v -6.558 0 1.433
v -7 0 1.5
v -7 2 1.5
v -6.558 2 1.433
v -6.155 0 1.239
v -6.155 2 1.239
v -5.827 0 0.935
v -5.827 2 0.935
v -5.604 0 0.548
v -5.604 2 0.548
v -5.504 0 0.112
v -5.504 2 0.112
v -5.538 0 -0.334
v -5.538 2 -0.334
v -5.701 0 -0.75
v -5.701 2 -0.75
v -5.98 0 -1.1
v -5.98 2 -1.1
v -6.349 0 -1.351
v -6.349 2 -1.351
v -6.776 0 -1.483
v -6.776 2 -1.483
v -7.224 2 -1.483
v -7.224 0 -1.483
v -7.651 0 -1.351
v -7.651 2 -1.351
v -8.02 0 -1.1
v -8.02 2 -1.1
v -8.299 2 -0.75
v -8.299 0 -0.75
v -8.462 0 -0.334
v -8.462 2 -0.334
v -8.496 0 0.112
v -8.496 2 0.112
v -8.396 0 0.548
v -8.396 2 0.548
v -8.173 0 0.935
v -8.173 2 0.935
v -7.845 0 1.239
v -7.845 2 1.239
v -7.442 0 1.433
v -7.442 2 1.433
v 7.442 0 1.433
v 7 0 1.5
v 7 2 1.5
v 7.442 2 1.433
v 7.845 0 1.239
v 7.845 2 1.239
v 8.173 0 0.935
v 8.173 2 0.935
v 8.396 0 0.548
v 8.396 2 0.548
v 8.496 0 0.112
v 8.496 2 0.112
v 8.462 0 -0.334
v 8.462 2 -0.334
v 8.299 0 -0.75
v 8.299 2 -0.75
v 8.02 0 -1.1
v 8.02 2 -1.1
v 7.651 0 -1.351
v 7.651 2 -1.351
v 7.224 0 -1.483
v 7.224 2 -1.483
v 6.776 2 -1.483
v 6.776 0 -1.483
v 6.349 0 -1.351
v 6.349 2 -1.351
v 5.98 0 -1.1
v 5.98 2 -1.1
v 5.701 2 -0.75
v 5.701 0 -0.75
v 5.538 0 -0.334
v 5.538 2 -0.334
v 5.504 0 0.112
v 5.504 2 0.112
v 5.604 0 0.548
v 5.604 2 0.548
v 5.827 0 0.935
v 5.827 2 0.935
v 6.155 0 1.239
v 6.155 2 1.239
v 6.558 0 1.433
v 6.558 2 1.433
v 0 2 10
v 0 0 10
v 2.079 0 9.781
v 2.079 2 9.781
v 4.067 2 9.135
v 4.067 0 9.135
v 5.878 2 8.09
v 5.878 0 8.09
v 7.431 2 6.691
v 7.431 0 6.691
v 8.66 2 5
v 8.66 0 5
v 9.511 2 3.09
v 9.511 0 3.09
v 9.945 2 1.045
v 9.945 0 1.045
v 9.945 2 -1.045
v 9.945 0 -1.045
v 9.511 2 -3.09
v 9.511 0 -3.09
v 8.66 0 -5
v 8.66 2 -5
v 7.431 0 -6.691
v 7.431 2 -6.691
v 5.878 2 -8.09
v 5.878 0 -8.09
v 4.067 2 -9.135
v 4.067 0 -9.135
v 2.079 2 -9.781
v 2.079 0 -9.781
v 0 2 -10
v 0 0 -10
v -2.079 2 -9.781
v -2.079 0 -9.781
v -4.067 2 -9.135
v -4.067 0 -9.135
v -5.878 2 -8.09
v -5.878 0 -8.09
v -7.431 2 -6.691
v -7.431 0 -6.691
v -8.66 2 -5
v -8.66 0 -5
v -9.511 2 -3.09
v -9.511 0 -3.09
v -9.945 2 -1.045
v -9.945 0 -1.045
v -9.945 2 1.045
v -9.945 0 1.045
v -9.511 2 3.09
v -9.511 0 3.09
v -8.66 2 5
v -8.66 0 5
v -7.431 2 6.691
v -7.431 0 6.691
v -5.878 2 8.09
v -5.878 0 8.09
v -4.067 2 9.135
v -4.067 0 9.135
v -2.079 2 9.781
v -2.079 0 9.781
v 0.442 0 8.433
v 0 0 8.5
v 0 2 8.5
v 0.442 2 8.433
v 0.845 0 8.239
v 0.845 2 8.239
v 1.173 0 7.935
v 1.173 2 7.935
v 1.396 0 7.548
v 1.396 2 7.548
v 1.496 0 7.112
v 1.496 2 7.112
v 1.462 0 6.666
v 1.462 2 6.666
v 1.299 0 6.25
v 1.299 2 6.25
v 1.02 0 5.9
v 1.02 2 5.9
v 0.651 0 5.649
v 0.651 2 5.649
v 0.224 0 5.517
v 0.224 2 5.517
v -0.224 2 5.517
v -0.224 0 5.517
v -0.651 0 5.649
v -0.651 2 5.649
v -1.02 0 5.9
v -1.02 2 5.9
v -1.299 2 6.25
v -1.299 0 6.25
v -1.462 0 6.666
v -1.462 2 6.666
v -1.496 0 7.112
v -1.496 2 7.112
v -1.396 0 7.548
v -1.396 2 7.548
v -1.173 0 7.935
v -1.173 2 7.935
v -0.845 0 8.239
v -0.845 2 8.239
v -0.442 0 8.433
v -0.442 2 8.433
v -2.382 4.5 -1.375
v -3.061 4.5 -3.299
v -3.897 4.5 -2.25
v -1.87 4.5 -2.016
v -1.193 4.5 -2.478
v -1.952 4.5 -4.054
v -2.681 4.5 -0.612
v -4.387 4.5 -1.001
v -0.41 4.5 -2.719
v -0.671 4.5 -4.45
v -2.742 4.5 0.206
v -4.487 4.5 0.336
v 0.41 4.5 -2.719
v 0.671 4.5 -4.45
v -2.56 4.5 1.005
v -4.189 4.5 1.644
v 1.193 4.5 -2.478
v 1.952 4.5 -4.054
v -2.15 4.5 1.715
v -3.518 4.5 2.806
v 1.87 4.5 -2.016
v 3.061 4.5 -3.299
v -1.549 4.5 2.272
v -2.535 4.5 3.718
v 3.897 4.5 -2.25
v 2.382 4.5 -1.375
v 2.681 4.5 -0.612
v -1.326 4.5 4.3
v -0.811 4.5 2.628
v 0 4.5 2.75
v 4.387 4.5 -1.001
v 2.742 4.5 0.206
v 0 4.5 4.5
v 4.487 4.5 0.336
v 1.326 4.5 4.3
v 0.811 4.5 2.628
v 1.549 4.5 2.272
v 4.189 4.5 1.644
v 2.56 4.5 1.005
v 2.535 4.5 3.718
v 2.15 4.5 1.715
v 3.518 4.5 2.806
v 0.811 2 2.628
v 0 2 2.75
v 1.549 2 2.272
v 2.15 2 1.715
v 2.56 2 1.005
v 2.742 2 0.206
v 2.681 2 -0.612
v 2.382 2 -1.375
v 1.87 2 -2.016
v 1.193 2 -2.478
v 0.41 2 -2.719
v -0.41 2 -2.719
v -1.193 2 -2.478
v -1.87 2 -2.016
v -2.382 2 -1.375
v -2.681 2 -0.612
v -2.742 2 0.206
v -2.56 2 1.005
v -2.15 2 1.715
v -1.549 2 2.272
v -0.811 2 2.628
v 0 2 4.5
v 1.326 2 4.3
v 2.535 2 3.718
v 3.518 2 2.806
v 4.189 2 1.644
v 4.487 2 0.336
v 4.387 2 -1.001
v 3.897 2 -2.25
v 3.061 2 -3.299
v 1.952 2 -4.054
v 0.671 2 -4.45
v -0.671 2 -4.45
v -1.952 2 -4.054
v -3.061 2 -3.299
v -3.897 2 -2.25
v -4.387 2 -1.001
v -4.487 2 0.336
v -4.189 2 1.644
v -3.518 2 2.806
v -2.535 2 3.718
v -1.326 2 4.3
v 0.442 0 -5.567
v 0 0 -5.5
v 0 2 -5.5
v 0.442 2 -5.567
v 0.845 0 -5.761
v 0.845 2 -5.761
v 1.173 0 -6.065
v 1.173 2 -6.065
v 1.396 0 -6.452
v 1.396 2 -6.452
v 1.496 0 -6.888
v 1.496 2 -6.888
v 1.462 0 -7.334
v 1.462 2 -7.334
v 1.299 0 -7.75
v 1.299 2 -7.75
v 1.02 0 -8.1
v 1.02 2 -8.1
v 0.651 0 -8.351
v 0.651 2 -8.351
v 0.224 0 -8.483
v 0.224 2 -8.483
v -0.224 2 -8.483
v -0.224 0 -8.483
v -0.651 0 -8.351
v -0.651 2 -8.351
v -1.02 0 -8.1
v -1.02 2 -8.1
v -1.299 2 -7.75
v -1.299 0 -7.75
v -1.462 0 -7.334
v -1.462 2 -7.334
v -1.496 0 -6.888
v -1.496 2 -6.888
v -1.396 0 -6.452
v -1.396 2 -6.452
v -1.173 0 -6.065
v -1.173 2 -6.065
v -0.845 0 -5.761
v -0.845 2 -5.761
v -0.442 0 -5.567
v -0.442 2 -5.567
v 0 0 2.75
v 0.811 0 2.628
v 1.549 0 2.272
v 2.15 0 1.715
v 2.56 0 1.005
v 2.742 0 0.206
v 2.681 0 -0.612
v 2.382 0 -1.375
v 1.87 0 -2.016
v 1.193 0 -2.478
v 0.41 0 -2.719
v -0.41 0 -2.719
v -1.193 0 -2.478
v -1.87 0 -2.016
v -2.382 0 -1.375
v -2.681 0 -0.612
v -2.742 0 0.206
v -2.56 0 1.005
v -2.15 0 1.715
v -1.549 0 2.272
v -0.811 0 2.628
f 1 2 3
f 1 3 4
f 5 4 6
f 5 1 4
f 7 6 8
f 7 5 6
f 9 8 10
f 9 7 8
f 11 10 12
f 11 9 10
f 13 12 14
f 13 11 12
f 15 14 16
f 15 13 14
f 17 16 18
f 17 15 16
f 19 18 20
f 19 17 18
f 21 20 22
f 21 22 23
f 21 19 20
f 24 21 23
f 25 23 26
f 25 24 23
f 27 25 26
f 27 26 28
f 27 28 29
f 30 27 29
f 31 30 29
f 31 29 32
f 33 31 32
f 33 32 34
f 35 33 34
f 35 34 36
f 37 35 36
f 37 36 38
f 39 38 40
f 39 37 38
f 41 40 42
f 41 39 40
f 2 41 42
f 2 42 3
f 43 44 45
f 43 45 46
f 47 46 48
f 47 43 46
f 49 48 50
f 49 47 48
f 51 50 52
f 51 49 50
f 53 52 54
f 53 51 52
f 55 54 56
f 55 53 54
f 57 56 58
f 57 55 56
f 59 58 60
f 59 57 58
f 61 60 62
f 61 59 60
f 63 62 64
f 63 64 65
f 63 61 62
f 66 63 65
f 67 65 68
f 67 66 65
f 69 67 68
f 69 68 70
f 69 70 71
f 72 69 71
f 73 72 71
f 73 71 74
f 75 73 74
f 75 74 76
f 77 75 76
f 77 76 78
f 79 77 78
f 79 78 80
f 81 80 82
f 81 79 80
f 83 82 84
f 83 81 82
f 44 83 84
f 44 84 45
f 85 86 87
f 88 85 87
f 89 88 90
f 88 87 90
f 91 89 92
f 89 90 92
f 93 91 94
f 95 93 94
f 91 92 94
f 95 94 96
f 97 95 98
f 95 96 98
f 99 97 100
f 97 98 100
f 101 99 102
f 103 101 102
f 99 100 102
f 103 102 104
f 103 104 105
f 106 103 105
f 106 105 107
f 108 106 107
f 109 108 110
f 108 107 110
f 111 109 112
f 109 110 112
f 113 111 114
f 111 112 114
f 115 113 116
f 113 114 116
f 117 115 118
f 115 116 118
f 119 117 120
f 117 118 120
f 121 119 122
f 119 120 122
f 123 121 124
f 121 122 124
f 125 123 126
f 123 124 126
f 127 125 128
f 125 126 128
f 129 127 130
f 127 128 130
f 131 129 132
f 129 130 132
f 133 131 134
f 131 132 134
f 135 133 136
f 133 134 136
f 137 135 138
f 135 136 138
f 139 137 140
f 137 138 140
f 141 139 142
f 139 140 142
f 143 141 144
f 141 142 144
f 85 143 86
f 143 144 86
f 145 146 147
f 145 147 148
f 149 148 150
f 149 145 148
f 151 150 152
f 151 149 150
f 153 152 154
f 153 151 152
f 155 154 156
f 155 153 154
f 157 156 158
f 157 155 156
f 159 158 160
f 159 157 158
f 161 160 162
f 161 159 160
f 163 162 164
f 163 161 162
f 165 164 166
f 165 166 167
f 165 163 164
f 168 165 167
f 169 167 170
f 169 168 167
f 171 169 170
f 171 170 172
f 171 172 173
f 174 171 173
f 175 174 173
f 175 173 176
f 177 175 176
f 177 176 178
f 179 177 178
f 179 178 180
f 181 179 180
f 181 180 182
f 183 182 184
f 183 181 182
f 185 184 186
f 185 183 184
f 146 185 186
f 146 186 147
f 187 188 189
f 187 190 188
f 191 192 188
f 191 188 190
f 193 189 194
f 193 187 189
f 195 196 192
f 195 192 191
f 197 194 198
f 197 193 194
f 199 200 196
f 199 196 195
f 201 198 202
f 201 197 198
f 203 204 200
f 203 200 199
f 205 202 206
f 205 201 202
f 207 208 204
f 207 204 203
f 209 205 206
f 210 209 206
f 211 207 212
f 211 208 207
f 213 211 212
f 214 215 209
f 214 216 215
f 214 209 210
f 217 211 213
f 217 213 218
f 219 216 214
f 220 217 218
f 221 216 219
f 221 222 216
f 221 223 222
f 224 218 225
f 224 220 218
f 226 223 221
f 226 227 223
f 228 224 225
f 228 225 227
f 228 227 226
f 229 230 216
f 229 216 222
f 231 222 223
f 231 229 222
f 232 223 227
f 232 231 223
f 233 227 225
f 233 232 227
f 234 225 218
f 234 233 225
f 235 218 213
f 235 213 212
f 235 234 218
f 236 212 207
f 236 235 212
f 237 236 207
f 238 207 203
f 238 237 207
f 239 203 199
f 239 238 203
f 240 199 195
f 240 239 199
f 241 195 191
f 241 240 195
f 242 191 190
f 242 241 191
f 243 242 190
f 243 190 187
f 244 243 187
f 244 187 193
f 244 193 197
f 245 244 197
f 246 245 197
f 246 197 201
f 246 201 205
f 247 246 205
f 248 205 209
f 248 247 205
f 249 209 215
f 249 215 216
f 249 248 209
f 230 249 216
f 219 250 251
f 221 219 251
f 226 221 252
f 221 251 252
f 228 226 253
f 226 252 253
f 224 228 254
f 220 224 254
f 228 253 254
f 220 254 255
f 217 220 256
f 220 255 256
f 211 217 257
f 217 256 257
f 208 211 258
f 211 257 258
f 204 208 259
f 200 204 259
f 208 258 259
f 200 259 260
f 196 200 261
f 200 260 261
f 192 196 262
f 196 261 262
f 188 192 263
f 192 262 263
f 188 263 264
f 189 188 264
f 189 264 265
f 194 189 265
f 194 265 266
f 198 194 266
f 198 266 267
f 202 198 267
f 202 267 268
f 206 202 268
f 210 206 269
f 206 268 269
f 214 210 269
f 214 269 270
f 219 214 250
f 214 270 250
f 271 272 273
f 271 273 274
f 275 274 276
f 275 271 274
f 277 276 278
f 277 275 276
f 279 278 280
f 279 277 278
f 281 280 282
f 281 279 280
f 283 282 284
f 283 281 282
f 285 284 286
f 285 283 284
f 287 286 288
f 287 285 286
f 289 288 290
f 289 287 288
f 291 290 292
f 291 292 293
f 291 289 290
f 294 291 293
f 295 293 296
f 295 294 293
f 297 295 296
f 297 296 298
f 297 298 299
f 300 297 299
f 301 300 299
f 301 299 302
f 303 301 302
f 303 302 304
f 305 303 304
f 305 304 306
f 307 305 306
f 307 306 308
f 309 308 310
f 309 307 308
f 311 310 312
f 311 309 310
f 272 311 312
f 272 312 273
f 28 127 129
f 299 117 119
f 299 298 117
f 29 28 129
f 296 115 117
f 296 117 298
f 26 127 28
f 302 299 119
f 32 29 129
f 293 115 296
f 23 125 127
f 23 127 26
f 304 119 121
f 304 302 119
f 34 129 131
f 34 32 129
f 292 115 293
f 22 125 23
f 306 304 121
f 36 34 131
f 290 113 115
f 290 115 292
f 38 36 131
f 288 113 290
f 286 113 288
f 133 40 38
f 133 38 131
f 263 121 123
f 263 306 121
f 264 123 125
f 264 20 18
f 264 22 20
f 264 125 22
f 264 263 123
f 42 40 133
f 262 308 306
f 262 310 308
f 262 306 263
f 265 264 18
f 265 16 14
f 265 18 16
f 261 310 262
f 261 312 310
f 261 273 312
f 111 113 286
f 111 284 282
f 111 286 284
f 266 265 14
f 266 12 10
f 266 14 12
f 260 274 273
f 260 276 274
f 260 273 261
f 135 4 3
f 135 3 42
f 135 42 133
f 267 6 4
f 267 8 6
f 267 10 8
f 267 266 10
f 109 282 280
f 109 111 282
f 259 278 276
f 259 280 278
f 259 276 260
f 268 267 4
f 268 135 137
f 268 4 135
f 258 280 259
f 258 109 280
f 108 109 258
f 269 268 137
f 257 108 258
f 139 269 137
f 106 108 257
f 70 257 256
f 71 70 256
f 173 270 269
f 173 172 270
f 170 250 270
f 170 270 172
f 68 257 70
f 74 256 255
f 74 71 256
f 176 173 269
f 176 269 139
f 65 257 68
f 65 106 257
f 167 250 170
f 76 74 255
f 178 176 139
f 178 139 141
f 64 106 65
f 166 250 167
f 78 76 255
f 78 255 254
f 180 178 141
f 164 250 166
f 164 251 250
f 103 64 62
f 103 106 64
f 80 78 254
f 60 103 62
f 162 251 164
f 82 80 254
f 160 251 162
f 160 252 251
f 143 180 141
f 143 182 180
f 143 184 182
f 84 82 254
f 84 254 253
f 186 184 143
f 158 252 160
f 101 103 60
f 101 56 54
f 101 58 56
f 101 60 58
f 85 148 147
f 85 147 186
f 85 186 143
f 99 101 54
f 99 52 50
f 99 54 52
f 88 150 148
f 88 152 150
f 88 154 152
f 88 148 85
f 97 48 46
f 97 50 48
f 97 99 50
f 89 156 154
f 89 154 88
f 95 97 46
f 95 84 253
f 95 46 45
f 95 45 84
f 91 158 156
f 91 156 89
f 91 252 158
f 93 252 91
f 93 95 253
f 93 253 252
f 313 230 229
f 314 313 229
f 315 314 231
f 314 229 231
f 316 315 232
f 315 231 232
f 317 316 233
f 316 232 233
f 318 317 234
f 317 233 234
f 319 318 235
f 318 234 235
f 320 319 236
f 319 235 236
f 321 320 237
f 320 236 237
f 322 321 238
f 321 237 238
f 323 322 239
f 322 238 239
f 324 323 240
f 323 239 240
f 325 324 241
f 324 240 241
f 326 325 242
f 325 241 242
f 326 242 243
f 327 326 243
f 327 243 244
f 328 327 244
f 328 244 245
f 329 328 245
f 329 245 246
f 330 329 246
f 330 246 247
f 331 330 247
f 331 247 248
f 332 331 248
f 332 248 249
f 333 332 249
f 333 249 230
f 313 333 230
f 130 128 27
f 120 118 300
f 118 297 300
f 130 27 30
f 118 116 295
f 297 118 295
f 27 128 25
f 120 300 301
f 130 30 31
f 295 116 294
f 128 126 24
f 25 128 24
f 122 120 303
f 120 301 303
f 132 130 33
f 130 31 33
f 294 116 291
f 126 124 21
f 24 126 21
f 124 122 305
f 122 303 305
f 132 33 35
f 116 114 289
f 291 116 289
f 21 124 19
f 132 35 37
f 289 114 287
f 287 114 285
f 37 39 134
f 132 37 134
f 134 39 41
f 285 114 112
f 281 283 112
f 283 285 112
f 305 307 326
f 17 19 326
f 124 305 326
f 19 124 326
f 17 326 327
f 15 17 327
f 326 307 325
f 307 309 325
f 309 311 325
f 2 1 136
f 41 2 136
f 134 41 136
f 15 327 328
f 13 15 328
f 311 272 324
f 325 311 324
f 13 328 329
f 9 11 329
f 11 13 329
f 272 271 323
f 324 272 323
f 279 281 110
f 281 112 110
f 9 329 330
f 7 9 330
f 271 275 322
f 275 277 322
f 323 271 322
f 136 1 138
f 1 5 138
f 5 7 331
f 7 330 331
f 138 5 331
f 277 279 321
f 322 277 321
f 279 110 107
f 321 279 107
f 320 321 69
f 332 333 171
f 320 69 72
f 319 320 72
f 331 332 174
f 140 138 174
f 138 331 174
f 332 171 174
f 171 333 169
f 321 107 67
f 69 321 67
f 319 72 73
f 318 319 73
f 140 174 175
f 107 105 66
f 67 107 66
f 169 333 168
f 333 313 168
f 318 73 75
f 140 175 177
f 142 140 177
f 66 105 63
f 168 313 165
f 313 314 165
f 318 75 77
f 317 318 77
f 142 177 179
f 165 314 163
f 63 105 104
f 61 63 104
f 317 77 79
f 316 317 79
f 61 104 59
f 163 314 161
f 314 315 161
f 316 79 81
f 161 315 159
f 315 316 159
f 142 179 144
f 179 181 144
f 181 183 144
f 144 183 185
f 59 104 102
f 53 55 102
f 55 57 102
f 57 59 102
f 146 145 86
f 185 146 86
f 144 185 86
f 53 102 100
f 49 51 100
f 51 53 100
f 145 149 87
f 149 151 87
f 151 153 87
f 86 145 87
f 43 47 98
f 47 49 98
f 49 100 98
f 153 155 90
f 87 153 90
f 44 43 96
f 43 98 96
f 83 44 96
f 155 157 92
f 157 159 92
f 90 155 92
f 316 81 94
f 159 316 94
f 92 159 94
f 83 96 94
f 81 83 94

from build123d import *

# Parameters (mm, degrees)
SKETCH_1_R          = 10
SKETCH_1_R_2        = 1.5
EXTRUDE_1_DEPTH     = 2
SKETCH_2_R          = 4.5
SKETCH_2_R_2        = 2.75
EXTRUDE_2_DEPTH     = 2.5
SKETCH_3_R          = 2.75
CUT_EXTRUDE_1_DEPTH = 15.361406616


with BuildPart() as part:
    # 草图1 → 凸台-拉伸1 (new body)
    with BuildSketch(Plane(origin=(0, 0, 0), x_dir=(1, 0, 0), z_dir=(0, 1, 0))):
        with Locations(Location((0, 0, 0), (0, 0, 270))):
            Circle(SKETCH_1_R)
        with Locations(Location((0, 7, 0), (0, 0, 270))):
            Circle(SKETCH_1_R_2, mode=Mode.SUBTRACT)
        with Locations(Location((-7, 0, 0), (0, 0, 270))):
            Circle(SKETCH_1_R_2, mode=Mode.SUBTRACT)
        with Locations(Location((0, -7, 0), (0, 0, 270))):
            Circle(SKETCH_1_R_2, mode=Mode.SUBTRACT)
        with Locations(Location((7, 0, 0), (0, 0, 270))):
            Circle(SKETCH_1_R_2, mode=Mode.SUBTRACT)
    extrude(amount=EXTRUDE_1_DEPTH)

    # 草图2 → 凸台-拉伸2 (add)
    with BuildSketch(Plane(origin=(0, 2, 0), x_dir=(1, 0, 0), z_dir=(0, 1, 0))):
        with Locations(Location((0, 0, 0), (0, 0, 270))):
            Circle(SKETCH_2_R)
        with Locations(Location((0, 0, 0), (0, 0, 270))):
            Circle(SKETCH_2_R_2, mode=Mode.SUBTRACT)
    extrude(amount=EXTRUDE_2_DEPTH)

    # 草图3 → 切除-拉伸1 (cut, through all)
    with BuildSketch(Plane(origin=(0, 2, 0), x_dir=(1, 0, 0), z_dir=(0, 1, 0))):
        with Locations(Location((0, 0, 0), (0, 0, 270))):
            Circle(SKETCH_3_R)
    extrude(amount=-CUT_EXTRUDE_1_DEPTH, mode=Mode.SUBTRACT)


solid = part.part
